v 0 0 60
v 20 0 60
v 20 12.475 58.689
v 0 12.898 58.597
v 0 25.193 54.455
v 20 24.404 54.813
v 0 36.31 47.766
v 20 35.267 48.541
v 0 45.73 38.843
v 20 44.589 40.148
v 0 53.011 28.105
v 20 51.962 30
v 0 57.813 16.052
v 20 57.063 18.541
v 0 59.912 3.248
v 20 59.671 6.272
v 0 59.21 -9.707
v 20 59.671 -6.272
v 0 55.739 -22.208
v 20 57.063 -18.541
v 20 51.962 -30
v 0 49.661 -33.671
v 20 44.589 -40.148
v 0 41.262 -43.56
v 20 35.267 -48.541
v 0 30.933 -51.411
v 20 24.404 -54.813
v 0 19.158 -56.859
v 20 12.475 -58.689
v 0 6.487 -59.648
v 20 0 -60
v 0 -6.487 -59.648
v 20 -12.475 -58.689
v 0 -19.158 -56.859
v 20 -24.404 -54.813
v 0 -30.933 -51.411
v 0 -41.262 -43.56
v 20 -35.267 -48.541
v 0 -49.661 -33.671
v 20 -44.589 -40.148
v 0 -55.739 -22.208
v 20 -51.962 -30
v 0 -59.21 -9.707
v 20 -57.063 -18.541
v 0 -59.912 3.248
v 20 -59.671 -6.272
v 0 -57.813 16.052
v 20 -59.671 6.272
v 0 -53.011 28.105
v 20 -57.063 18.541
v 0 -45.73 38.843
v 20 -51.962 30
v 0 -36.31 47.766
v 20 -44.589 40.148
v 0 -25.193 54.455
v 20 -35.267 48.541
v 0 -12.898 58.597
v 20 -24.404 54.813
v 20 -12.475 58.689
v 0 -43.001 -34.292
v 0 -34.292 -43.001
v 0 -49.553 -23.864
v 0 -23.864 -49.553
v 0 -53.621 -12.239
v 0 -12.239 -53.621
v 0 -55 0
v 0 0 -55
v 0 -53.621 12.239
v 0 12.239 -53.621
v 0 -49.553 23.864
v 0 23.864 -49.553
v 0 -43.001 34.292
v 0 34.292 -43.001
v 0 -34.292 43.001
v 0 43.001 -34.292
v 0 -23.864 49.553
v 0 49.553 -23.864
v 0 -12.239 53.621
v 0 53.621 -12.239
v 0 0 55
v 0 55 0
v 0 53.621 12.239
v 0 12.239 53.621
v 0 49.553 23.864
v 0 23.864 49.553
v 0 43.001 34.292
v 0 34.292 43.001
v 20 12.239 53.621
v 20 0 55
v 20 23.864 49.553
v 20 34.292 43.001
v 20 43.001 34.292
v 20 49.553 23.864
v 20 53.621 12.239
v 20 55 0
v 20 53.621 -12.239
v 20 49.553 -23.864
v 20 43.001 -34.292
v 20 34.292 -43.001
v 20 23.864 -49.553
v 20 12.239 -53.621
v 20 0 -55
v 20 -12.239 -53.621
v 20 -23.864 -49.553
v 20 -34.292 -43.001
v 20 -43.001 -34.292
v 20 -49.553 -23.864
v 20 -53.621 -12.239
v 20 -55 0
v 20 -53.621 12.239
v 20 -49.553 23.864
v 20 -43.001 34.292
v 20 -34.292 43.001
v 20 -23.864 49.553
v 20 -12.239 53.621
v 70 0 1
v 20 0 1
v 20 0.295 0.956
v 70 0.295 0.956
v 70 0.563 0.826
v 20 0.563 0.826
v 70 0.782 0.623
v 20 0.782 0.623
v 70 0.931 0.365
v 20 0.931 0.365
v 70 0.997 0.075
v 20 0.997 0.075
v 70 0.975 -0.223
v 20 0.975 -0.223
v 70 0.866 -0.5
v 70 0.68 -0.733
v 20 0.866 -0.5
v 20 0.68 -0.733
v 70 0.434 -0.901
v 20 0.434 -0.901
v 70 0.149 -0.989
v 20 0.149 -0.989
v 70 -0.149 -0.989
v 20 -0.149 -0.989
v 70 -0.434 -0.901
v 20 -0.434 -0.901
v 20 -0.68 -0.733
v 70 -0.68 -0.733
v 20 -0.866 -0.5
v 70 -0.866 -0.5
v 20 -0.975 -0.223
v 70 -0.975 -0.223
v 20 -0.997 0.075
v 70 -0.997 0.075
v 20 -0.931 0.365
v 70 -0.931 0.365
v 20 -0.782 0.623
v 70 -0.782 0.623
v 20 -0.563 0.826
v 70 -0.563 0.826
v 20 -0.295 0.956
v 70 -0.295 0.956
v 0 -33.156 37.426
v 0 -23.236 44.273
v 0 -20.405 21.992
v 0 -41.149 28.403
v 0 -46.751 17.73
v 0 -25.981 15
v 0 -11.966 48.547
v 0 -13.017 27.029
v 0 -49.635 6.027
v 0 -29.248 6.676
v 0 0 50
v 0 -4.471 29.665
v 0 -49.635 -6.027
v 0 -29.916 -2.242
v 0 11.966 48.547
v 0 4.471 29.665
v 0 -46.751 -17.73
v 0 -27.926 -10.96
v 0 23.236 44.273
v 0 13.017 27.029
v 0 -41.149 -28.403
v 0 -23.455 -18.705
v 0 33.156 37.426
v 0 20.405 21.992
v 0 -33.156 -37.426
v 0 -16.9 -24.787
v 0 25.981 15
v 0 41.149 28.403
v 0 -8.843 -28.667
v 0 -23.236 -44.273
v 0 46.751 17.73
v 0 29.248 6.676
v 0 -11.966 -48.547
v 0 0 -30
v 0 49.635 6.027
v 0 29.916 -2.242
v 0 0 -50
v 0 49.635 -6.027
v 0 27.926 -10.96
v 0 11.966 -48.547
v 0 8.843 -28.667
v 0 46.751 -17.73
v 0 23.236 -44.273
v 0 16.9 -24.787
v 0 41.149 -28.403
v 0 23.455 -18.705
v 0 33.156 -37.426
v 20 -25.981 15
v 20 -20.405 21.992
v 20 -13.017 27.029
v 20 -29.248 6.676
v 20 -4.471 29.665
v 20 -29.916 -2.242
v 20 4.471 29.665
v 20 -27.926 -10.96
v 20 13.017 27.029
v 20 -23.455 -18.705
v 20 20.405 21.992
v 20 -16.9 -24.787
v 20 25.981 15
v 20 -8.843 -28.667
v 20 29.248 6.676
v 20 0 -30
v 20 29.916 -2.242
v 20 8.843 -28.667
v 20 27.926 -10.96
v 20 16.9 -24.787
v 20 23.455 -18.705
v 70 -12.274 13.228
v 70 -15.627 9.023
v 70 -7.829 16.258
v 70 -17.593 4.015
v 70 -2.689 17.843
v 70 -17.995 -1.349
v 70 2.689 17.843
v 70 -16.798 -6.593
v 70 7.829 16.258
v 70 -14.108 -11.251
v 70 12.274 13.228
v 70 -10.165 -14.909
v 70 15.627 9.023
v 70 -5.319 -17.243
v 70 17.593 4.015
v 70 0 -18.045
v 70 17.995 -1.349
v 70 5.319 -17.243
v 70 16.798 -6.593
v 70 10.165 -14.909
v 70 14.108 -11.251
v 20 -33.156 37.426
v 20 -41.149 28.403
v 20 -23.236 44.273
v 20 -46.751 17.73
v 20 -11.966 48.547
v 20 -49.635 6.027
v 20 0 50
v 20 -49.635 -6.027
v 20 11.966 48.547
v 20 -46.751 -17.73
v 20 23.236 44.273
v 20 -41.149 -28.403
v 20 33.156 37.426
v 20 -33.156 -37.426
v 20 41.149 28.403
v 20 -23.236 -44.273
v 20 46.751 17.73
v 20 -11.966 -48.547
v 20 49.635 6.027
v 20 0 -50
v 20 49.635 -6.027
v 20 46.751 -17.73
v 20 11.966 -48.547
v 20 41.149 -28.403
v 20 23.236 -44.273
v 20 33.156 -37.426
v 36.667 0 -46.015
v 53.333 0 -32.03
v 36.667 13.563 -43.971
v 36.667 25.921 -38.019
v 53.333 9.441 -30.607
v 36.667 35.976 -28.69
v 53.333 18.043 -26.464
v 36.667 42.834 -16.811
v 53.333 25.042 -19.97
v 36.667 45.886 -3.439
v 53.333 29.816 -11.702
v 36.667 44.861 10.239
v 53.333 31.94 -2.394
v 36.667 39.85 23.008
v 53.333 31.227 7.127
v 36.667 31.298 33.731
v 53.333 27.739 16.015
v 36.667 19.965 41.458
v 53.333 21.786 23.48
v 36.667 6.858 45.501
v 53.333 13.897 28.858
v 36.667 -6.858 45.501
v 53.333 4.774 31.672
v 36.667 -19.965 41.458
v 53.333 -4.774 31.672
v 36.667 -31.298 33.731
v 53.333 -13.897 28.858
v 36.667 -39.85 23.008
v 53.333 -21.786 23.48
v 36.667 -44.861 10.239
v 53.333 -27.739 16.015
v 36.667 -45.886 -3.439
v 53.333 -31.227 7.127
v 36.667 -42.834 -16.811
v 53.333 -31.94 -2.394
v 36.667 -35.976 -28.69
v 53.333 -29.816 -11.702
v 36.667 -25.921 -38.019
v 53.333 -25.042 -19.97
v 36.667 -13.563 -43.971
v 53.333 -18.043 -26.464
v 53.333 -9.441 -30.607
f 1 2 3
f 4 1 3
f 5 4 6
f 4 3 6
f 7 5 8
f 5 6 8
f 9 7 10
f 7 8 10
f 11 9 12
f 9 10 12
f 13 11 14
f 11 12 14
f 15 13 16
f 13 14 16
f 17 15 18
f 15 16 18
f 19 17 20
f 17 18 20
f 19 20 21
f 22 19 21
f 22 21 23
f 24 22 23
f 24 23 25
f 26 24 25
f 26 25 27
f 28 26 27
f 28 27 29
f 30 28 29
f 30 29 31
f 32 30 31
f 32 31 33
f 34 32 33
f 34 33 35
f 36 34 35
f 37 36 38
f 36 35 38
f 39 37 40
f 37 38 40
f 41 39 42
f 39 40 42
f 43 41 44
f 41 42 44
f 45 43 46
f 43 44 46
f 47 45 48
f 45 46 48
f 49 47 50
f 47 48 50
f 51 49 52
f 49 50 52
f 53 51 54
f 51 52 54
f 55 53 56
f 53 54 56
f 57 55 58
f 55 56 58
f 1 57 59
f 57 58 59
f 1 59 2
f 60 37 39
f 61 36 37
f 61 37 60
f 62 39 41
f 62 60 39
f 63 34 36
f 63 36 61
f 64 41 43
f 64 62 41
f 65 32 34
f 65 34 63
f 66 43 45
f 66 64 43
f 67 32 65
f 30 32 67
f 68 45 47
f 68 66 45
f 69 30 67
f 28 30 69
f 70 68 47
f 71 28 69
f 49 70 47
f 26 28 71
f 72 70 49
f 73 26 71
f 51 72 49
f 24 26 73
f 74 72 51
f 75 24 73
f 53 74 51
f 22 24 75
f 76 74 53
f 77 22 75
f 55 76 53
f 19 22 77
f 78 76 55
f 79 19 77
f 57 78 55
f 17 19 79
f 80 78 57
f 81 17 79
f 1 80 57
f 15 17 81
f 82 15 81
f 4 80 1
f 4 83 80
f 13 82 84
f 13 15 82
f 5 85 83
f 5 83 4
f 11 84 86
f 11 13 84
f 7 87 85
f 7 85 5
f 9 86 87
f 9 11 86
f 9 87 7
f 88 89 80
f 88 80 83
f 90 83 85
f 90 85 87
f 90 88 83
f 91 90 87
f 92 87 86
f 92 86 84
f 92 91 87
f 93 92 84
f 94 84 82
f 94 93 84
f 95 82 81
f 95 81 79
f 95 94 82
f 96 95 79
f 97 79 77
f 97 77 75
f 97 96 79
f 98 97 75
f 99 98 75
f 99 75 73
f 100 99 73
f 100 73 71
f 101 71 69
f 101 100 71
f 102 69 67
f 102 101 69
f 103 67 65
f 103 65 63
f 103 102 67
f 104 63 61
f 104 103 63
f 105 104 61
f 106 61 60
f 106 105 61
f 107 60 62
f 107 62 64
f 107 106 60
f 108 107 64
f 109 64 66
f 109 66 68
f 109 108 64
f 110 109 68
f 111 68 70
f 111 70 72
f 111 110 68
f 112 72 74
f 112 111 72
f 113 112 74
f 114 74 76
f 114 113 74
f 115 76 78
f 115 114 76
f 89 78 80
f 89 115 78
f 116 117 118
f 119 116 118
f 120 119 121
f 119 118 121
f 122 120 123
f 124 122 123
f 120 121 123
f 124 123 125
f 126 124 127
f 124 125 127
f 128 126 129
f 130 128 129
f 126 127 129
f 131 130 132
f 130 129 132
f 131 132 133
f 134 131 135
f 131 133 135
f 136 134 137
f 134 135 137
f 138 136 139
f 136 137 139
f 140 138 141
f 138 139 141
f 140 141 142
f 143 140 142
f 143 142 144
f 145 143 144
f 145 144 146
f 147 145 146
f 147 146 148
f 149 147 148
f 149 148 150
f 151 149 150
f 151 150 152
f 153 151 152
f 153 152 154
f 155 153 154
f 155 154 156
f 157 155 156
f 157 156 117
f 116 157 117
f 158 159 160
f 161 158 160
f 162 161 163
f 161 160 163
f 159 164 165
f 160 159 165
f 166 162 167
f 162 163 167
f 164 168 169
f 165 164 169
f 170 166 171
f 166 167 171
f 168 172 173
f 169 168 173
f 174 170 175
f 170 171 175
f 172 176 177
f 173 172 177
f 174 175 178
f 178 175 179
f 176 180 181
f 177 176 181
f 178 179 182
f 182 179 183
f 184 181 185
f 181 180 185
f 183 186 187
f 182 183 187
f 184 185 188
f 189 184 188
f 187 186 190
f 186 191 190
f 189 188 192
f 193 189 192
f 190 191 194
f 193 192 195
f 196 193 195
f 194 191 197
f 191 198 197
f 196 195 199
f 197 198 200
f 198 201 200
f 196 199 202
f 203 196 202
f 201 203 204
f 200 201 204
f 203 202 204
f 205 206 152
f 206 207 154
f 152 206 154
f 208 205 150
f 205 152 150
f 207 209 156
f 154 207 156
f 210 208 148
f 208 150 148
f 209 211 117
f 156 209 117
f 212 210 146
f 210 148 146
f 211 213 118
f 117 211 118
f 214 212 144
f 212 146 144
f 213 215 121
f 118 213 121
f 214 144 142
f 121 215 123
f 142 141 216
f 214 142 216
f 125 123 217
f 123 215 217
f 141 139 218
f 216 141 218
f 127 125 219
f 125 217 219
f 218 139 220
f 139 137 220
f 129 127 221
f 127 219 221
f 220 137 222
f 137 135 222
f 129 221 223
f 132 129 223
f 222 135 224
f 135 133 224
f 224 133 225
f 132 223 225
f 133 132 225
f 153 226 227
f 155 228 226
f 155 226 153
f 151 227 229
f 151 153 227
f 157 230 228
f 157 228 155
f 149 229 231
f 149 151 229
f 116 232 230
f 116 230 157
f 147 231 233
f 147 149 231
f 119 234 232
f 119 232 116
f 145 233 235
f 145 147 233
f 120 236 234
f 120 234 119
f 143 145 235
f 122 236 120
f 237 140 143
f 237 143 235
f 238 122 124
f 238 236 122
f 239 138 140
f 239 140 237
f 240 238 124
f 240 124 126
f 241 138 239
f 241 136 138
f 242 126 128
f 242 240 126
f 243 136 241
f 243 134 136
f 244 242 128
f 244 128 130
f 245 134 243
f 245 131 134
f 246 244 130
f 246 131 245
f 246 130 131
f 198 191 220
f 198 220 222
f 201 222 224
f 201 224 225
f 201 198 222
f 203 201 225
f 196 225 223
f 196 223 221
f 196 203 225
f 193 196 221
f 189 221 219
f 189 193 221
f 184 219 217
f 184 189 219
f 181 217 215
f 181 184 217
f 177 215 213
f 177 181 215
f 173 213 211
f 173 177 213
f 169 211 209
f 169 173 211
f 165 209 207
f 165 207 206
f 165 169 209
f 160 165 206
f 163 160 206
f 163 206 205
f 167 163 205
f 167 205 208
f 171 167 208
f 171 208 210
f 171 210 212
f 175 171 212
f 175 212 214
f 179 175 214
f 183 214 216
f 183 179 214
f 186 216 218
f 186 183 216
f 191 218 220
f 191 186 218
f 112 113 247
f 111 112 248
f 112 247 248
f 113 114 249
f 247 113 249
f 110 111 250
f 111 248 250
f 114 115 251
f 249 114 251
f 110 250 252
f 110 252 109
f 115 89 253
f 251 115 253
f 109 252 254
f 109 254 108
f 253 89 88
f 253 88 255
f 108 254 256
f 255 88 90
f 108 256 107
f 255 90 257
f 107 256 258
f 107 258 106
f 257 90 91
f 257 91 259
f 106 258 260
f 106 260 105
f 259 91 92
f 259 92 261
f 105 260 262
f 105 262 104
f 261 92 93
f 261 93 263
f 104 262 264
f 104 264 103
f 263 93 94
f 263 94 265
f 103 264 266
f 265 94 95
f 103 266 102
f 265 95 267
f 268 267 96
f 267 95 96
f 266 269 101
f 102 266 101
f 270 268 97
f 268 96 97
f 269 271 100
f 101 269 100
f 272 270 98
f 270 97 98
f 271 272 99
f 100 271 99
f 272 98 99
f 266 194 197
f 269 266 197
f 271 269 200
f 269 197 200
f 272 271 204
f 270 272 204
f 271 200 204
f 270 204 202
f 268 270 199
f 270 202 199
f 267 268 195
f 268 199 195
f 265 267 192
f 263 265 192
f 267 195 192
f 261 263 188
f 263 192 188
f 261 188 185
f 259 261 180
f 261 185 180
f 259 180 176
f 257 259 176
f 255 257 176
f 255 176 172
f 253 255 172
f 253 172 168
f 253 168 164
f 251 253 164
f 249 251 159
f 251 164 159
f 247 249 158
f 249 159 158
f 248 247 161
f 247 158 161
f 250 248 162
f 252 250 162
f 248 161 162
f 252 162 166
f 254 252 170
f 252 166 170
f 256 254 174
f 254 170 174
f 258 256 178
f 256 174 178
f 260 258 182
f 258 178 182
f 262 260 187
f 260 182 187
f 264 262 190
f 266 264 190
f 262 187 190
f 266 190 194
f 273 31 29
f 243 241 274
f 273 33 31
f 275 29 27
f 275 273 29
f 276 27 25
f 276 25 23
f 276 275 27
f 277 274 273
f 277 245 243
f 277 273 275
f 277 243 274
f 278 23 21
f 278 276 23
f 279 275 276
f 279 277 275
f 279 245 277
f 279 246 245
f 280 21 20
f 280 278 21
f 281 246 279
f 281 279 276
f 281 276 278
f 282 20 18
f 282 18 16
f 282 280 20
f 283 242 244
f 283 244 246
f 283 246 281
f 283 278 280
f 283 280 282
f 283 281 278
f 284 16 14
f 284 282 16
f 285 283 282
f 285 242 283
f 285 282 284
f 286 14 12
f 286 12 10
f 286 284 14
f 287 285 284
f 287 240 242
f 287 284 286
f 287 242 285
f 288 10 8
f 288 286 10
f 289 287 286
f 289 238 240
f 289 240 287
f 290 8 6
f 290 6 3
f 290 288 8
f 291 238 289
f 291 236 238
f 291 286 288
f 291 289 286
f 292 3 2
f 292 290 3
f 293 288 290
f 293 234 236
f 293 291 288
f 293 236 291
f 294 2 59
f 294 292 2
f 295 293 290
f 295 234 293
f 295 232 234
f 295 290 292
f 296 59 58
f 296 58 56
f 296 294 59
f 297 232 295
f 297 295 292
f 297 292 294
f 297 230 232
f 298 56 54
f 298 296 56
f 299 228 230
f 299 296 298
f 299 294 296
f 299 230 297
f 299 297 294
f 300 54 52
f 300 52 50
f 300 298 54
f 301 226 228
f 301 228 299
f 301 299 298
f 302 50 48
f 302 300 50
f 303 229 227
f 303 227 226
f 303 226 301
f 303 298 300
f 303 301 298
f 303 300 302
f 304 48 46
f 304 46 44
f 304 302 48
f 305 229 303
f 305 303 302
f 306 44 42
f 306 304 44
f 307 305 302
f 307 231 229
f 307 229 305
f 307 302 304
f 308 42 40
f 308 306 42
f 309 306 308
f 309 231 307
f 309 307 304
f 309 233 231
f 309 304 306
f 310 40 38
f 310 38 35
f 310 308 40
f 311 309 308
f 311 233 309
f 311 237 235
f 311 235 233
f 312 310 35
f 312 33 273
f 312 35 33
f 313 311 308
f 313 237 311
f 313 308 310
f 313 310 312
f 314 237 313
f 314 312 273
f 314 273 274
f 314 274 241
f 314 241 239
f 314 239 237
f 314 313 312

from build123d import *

# Parameters (mm, degrees)
SKETCH1_R           = 50
SKETCH1_R_2         = 30
BOSS_EXTRUDE1_DEPTH = 20
SKETCH2_R           = 60
BOSS_EXTRUDE4_DEPTH = 50
BOSS_EXTRUDE4_TAPER = 40
SKETCH5_R           = 60
SKETCH5_R_2         = 55
BOSS_EXTRUDE5_DEPTH = 20
SKETCH6_R           = 1
CUT_EXTRUDE1_DEPTH  = 51.0000001


with BuildPart() as part:
    # Sketch1 → Boss-Extrude1 (new body)
    with BuildSketch(Plane(origin=(0, 0, 0), x_dir=(0, 0, -1), z_dir=(1, 0, 0))):
        Circle(SKETCH1_R)
        Circle(SKETCH1_R_2, mode=Mode.SUBTRACT)
    extrude(amount=BOSS_EXTRUDE1_DEPTH)

    # Sketch2 → Boss-Extrude4 (add)
    with BuildSketch(Plane(origin=(20, 0, 0), x_dir=(0, 0, -1), z_dir=(1, 0, 0))):
        Circle(SKETCH2_R)
    extrude(amount=BOSS_EXTRUDE4_DEPTH, taper=BOSS_EXTRUDE4_TAPER)

    # Sketch5 → Boss-Extrude5 (add)
    with BuildSketch(Plane.ZY.offset(-20)):
        Circle(SKETCH5_R)
        Circle(SKETCH5_R_2, mode=Mode.SUBTRACT)
    extrude(amount=BOSS_EXTRUDE5_DEPTH)

    # Sketch6 → Cut-Extrude1 (cut, through all)
    with BuildSketch(Plane.ZY.offset(-20)):
        Circle(SKETCH6_R)
    extrude(amount=-CUT_EXTRUDE1_DEPTH, mode=Mode.SUBTRACT)


solid = part.part
